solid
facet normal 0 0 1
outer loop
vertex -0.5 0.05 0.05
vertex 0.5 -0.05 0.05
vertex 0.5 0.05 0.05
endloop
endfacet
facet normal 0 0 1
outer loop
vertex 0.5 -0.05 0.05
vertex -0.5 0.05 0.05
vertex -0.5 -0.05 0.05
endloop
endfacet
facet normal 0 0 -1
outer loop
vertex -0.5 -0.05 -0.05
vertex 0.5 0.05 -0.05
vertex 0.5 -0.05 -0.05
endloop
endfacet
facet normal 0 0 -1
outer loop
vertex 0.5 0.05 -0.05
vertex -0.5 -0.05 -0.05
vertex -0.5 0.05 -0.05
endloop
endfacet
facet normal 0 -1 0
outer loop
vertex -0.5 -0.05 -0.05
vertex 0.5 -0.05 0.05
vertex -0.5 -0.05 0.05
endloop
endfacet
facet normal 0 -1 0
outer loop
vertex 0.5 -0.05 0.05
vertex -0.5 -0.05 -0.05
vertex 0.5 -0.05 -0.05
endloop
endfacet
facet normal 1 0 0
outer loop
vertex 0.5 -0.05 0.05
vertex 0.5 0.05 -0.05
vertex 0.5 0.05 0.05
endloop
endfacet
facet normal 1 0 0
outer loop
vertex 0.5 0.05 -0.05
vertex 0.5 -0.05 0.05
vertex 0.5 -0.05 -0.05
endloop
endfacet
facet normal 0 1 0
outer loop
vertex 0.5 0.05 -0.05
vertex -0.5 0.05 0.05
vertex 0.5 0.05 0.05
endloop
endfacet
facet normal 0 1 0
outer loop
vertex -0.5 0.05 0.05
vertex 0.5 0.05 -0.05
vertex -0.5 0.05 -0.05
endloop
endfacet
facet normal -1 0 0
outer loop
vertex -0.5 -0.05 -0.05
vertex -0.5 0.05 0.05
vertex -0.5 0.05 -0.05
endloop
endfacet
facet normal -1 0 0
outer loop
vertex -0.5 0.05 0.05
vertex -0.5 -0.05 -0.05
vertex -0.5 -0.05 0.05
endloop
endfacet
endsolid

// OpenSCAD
include <../openscad2calculix.scad>

os2cx_material_elastic_simple(
    "steel",
    youngs_modulus=[209, "GPa"],
    poissons_ratio=0.3,
    density=[7.87, "g/cm^3"]);

os2cx_material_elastic_simple(
    "rubber",
    youngs_modulus=[0.1, "GPa"],
    poissons_ratio=0.49,
    density=[1.10, "g/cm^3"]);

os2cx_mesh("beam", material="steel") {
    cube([1, 0.1, 0.1], center=true);
}

os2cx_select_volume("rubber_part") {
    cube([0.1, 0.2, 0.2], center=true);
}
os2cx_override_material("rubber_part", material="rubber");

os2cx_select_surface("anchored_end", [-1, 0, 0], 45) {
    translate([-0.5, 0, 0]) cube([0.1, 0.2, 0.2], center=true);
}
os2cx_select_surface("loaded_end", [1, 0, 0], 45) {
    translate([0.5, 0, 0]) cube([0.1, 0.2, 0.2], center=true);
}

os2cx_load_surface(
    "load",
    "loaded_end",
    force_total=[[0, 0, -1], "kN"]);

os2cx_analysis_static_simple(
    fixed="anchored_end",
    load="load",
    length_unit="m"
);
